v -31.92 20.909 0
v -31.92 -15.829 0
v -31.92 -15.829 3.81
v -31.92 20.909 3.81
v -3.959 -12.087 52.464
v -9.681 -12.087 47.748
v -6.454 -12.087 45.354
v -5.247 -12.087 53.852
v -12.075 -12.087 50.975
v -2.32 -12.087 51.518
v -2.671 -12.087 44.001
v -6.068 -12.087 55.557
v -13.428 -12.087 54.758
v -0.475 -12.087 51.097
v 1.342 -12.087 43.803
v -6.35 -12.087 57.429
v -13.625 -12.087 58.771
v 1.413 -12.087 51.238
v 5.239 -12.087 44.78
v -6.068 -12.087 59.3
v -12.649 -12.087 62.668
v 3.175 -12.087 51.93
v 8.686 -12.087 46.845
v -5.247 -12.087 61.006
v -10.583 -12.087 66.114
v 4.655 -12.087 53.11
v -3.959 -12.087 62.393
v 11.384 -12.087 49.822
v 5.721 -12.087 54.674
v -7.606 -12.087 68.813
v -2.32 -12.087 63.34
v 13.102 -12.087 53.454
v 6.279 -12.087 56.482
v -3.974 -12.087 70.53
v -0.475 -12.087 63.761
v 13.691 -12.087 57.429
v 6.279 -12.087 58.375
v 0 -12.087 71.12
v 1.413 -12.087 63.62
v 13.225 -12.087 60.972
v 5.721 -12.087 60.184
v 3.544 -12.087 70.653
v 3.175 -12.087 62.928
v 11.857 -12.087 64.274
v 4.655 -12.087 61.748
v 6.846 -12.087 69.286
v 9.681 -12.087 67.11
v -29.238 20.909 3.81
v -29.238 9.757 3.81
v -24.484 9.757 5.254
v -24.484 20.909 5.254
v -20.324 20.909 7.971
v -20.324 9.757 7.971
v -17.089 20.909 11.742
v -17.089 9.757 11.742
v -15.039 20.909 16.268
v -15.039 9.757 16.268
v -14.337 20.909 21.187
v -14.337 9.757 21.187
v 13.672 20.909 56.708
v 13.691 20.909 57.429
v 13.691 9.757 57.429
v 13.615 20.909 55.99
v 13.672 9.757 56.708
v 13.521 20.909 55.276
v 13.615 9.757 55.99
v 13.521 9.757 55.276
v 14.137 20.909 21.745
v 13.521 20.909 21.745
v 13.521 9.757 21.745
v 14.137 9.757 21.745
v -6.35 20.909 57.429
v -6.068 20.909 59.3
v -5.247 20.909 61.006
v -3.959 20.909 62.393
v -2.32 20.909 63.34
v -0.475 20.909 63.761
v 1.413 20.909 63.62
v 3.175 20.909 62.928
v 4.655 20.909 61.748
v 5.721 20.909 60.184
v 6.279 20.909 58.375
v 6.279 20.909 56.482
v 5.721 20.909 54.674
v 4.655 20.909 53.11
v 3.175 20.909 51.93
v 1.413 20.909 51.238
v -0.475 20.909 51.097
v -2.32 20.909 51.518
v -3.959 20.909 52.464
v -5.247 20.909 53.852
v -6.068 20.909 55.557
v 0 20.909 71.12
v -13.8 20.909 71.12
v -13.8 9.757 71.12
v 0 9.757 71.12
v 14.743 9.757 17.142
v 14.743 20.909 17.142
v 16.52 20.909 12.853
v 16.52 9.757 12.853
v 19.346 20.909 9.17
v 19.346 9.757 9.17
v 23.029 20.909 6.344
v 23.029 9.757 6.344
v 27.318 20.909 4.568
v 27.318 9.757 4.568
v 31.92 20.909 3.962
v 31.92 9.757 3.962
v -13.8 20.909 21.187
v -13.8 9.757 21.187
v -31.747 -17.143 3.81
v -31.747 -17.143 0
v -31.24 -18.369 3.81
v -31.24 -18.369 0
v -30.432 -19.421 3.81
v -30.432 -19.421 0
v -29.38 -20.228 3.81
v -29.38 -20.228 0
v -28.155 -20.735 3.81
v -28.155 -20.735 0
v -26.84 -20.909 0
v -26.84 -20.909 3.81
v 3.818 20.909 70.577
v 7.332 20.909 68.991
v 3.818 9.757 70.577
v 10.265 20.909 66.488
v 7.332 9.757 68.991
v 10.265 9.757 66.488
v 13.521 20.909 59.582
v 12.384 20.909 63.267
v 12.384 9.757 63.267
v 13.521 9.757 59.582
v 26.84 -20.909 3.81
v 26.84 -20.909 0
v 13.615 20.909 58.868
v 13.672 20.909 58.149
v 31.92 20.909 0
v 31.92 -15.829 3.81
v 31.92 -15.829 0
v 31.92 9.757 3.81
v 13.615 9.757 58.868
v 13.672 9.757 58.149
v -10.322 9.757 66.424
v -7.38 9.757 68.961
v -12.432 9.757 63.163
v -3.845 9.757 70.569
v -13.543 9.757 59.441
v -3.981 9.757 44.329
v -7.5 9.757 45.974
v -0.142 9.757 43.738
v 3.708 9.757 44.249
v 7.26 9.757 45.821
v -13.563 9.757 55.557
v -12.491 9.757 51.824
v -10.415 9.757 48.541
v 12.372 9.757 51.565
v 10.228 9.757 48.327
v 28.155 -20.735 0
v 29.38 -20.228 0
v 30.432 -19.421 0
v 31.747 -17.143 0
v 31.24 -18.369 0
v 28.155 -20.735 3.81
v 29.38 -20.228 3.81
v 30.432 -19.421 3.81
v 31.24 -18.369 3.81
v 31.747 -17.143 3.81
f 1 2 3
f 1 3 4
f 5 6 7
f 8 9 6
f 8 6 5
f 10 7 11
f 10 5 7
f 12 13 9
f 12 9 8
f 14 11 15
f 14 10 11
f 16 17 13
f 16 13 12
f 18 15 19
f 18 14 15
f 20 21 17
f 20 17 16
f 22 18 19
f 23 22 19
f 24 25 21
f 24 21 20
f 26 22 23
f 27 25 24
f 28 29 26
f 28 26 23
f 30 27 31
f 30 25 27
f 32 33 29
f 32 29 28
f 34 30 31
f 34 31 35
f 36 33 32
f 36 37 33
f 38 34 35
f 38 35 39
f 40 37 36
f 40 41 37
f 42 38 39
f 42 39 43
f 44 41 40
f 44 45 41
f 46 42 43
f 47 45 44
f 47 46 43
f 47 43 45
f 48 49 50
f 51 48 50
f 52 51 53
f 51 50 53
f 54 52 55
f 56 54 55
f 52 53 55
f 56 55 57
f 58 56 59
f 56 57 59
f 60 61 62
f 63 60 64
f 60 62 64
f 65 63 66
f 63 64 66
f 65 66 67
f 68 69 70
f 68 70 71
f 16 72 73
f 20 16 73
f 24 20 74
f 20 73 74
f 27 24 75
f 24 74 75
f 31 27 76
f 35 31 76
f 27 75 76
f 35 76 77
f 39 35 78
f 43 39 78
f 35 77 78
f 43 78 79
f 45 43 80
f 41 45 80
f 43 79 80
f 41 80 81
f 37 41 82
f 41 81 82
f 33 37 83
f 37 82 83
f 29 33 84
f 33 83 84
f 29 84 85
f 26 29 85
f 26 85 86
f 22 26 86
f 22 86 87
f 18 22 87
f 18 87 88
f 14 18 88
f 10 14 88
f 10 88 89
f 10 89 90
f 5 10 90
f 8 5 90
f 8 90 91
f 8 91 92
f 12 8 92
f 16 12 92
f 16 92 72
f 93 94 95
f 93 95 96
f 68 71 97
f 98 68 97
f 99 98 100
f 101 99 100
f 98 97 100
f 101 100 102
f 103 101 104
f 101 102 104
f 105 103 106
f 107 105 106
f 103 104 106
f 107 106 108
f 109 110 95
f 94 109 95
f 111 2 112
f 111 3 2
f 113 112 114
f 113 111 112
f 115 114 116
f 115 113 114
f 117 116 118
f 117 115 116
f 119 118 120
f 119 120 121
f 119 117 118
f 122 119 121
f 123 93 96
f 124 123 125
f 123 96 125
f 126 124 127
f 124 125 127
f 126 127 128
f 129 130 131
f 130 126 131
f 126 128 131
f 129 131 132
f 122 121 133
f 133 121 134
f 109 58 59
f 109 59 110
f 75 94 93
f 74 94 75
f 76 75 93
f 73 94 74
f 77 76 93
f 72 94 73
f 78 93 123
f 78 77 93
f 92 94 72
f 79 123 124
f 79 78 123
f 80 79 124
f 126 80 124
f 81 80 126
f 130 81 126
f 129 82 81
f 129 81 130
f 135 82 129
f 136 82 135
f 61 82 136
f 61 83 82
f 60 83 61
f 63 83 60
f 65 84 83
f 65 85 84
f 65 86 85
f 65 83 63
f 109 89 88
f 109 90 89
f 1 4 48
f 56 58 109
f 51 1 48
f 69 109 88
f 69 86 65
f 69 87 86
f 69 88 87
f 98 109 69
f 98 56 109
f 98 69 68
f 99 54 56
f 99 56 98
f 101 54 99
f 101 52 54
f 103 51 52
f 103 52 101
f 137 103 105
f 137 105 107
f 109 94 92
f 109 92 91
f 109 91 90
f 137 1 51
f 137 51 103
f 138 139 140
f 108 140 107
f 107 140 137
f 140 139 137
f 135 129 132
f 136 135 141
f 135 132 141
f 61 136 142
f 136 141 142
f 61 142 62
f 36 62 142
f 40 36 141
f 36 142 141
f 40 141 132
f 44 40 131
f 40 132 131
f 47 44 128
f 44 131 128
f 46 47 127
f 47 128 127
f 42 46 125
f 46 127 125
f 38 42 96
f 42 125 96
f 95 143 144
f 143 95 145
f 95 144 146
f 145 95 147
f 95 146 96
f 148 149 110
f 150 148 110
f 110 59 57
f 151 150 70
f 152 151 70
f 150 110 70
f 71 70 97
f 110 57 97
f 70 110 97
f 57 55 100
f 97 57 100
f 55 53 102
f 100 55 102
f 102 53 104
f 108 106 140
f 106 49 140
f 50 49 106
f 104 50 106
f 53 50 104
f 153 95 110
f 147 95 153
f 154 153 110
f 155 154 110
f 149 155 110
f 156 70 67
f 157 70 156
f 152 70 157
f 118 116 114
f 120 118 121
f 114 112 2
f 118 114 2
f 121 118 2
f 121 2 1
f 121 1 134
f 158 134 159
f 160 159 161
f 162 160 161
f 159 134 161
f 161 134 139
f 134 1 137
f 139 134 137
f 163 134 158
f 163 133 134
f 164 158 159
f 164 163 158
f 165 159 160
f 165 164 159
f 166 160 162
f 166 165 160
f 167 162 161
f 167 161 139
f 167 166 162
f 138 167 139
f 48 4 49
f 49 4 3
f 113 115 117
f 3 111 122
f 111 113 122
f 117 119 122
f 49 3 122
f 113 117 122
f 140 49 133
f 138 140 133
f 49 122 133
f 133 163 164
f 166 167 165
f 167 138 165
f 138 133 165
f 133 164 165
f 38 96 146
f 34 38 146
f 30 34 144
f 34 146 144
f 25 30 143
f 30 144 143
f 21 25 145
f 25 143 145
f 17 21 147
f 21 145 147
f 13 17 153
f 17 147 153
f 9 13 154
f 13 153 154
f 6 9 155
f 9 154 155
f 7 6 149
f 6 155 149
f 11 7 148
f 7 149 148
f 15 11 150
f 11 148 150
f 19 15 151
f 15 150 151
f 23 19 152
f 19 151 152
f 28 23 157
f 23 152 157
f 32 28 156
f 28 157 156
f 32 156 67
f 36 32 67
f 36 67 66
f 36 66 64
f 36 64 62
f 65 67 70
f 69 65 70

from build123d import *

# Parameters (mm, degrees)
F0_W      = 63.8407319784
F0_H      = 41.8170765042
F1_DEPTH  = 3.81
F2_R      = 5.08
F3_W      = 63.8407319784
F3_H      = 11.1512206495
F4_DEPTH  = 67.31
F6_DEPTH  = 21.844
F8_D      = 12.7
F9_W      = 18.1207312271
F9_H      = 49.9326833737
F10_DEPTH = 25.4
F12_DEPTH = 25.4


# Not quite as in the source:
# - a feature of the source that left no trace in its solid (it failed there, or was rolled back) is left out


with BuildPart() as f1:
    # F0 (on Top) → F1 (new body)
    with BuildSketch(Plane.XY):
        Rectangle(F0_W, F0_H)
    extrude(amount=F1_DEPTH)

    # F2
    f2_edges = [f1.edges().sort_by_distance(p)[0] for p in [
        (-31.920366, -20.908538, 1.905),
        (31.920366, -20.908538, 1.905),
    ]]
    fillet(f2_edges, radius=F2_R)

    # F3 (on face) → F4 (join)
    with BuildSketch(Plane.XY.offset(3.81)):
        with Locations((0, 15.3329279274)):
            Rectangle(F3_W, F3_H)
    extrude(amount=F4_DEPTH)

    # F5 (on face) → F6 (join)
    with BuildSketch(Plane.XZ.offset(-9.7573176026)):
        with BuildLine():
            ThreePointArc((1.435e-07, 71.12), (-9.6811538885, 47.7476271561), (13.6912190568, 57.4287809432))
            ThreePointArc((13.6912190568, 57.4287809432), (9.6811538885, 67.1099347302), (1.435e-07, 71.12))
        make_face()
    extrude(amount=F6_DEPTH)

    # F8 (through all)
    with Locations(Plane.XZ.offset(12.0866823974)):
        with Locations((0, 57.4287809432)):
            Hole(F8_D / 2)

    # F9 (on face) → F10 (cut)
    with BuildSketch(Plane.XZ.offset(-9.7573176026)):
        with Locations((-22.8600003757, 46.1536583132)):
            Rectangle(F9_W, F9_H)
        with BuildLine():
            Line((13.5208535939, 71.12), (-1.606e-07, 71.12))
            ThreePointArc((-1.606e-07, 71.12), (8.8873621455, 67.8433991962), (13.5208535939, 59.5819175746))
            Line((13.5208535939, 59.5819175746), (13.5208535939, 71.12))
        make_face()
        with BuildLine():
            Line((31.9203659892, 71.12), (13.5208535939, 71.12))
            Line((13.5208535939, 71.12), (13.5208535939, 59.5819175746))
            ThreePointArc((13.5208535939, 59.5819175746), (13.6485612365, 58.5087140134), (13.6912190568, 57.4287809432))
            ThreePointArc((13.6912190568, 57.4287809432), (13.6485612365, 56.3488478729), (13.5208535939, 55.2756443117))
            Line((13.5208535939, 55.2756443117), (13.5208535939, 21.7448789626))
            Line((13.5208535939, 21.7448789626), (31.9203659892, 21.7448789626))
            Line((31.9203659892, 21.7448789626), (31.9203659892, 71.12))
        make_face()
    extrude(amount=-F10_DEPTH, mode=Mode.SUBTRACT)

    # F11 (on face) → F12 (cut)
    with BuildSketch(Plane.XZ.offset(-9.7573176026)):
        with BuildLine():
            ThreePointArc((-29.2383271601, 3.81), (-18.5726517534, 9.7416628621), (-14.3372927251, 21.1873166263))
            Line((-14.3372927251, 21.1873166263), (-31.9203659892, 21.1873166263))
            Line((-31.9203659892, 21.1873166263), (-31.9203659892, 3.81))
            Line((-31.9203659892, 3.81), (-29.2383271601, 3.81))
        make_face()
        with BuildLine():
            ThreePointArc((14.1373165346, 21.7448789626), (19.3458511297, 9.1703641031), (31.9203659892, 3.9618295081))
            Line((31.9203659892, 3.9618295081), (31.9203659892, 21.7448789626))
            Line((31.9203659892, 21.7448789626), (14.1373165346, 21.7448789626))
        make_face()
    extrude(amount=-F12_DEPTH, mode=Mode.SUBTRACT)


solid = f1.part
